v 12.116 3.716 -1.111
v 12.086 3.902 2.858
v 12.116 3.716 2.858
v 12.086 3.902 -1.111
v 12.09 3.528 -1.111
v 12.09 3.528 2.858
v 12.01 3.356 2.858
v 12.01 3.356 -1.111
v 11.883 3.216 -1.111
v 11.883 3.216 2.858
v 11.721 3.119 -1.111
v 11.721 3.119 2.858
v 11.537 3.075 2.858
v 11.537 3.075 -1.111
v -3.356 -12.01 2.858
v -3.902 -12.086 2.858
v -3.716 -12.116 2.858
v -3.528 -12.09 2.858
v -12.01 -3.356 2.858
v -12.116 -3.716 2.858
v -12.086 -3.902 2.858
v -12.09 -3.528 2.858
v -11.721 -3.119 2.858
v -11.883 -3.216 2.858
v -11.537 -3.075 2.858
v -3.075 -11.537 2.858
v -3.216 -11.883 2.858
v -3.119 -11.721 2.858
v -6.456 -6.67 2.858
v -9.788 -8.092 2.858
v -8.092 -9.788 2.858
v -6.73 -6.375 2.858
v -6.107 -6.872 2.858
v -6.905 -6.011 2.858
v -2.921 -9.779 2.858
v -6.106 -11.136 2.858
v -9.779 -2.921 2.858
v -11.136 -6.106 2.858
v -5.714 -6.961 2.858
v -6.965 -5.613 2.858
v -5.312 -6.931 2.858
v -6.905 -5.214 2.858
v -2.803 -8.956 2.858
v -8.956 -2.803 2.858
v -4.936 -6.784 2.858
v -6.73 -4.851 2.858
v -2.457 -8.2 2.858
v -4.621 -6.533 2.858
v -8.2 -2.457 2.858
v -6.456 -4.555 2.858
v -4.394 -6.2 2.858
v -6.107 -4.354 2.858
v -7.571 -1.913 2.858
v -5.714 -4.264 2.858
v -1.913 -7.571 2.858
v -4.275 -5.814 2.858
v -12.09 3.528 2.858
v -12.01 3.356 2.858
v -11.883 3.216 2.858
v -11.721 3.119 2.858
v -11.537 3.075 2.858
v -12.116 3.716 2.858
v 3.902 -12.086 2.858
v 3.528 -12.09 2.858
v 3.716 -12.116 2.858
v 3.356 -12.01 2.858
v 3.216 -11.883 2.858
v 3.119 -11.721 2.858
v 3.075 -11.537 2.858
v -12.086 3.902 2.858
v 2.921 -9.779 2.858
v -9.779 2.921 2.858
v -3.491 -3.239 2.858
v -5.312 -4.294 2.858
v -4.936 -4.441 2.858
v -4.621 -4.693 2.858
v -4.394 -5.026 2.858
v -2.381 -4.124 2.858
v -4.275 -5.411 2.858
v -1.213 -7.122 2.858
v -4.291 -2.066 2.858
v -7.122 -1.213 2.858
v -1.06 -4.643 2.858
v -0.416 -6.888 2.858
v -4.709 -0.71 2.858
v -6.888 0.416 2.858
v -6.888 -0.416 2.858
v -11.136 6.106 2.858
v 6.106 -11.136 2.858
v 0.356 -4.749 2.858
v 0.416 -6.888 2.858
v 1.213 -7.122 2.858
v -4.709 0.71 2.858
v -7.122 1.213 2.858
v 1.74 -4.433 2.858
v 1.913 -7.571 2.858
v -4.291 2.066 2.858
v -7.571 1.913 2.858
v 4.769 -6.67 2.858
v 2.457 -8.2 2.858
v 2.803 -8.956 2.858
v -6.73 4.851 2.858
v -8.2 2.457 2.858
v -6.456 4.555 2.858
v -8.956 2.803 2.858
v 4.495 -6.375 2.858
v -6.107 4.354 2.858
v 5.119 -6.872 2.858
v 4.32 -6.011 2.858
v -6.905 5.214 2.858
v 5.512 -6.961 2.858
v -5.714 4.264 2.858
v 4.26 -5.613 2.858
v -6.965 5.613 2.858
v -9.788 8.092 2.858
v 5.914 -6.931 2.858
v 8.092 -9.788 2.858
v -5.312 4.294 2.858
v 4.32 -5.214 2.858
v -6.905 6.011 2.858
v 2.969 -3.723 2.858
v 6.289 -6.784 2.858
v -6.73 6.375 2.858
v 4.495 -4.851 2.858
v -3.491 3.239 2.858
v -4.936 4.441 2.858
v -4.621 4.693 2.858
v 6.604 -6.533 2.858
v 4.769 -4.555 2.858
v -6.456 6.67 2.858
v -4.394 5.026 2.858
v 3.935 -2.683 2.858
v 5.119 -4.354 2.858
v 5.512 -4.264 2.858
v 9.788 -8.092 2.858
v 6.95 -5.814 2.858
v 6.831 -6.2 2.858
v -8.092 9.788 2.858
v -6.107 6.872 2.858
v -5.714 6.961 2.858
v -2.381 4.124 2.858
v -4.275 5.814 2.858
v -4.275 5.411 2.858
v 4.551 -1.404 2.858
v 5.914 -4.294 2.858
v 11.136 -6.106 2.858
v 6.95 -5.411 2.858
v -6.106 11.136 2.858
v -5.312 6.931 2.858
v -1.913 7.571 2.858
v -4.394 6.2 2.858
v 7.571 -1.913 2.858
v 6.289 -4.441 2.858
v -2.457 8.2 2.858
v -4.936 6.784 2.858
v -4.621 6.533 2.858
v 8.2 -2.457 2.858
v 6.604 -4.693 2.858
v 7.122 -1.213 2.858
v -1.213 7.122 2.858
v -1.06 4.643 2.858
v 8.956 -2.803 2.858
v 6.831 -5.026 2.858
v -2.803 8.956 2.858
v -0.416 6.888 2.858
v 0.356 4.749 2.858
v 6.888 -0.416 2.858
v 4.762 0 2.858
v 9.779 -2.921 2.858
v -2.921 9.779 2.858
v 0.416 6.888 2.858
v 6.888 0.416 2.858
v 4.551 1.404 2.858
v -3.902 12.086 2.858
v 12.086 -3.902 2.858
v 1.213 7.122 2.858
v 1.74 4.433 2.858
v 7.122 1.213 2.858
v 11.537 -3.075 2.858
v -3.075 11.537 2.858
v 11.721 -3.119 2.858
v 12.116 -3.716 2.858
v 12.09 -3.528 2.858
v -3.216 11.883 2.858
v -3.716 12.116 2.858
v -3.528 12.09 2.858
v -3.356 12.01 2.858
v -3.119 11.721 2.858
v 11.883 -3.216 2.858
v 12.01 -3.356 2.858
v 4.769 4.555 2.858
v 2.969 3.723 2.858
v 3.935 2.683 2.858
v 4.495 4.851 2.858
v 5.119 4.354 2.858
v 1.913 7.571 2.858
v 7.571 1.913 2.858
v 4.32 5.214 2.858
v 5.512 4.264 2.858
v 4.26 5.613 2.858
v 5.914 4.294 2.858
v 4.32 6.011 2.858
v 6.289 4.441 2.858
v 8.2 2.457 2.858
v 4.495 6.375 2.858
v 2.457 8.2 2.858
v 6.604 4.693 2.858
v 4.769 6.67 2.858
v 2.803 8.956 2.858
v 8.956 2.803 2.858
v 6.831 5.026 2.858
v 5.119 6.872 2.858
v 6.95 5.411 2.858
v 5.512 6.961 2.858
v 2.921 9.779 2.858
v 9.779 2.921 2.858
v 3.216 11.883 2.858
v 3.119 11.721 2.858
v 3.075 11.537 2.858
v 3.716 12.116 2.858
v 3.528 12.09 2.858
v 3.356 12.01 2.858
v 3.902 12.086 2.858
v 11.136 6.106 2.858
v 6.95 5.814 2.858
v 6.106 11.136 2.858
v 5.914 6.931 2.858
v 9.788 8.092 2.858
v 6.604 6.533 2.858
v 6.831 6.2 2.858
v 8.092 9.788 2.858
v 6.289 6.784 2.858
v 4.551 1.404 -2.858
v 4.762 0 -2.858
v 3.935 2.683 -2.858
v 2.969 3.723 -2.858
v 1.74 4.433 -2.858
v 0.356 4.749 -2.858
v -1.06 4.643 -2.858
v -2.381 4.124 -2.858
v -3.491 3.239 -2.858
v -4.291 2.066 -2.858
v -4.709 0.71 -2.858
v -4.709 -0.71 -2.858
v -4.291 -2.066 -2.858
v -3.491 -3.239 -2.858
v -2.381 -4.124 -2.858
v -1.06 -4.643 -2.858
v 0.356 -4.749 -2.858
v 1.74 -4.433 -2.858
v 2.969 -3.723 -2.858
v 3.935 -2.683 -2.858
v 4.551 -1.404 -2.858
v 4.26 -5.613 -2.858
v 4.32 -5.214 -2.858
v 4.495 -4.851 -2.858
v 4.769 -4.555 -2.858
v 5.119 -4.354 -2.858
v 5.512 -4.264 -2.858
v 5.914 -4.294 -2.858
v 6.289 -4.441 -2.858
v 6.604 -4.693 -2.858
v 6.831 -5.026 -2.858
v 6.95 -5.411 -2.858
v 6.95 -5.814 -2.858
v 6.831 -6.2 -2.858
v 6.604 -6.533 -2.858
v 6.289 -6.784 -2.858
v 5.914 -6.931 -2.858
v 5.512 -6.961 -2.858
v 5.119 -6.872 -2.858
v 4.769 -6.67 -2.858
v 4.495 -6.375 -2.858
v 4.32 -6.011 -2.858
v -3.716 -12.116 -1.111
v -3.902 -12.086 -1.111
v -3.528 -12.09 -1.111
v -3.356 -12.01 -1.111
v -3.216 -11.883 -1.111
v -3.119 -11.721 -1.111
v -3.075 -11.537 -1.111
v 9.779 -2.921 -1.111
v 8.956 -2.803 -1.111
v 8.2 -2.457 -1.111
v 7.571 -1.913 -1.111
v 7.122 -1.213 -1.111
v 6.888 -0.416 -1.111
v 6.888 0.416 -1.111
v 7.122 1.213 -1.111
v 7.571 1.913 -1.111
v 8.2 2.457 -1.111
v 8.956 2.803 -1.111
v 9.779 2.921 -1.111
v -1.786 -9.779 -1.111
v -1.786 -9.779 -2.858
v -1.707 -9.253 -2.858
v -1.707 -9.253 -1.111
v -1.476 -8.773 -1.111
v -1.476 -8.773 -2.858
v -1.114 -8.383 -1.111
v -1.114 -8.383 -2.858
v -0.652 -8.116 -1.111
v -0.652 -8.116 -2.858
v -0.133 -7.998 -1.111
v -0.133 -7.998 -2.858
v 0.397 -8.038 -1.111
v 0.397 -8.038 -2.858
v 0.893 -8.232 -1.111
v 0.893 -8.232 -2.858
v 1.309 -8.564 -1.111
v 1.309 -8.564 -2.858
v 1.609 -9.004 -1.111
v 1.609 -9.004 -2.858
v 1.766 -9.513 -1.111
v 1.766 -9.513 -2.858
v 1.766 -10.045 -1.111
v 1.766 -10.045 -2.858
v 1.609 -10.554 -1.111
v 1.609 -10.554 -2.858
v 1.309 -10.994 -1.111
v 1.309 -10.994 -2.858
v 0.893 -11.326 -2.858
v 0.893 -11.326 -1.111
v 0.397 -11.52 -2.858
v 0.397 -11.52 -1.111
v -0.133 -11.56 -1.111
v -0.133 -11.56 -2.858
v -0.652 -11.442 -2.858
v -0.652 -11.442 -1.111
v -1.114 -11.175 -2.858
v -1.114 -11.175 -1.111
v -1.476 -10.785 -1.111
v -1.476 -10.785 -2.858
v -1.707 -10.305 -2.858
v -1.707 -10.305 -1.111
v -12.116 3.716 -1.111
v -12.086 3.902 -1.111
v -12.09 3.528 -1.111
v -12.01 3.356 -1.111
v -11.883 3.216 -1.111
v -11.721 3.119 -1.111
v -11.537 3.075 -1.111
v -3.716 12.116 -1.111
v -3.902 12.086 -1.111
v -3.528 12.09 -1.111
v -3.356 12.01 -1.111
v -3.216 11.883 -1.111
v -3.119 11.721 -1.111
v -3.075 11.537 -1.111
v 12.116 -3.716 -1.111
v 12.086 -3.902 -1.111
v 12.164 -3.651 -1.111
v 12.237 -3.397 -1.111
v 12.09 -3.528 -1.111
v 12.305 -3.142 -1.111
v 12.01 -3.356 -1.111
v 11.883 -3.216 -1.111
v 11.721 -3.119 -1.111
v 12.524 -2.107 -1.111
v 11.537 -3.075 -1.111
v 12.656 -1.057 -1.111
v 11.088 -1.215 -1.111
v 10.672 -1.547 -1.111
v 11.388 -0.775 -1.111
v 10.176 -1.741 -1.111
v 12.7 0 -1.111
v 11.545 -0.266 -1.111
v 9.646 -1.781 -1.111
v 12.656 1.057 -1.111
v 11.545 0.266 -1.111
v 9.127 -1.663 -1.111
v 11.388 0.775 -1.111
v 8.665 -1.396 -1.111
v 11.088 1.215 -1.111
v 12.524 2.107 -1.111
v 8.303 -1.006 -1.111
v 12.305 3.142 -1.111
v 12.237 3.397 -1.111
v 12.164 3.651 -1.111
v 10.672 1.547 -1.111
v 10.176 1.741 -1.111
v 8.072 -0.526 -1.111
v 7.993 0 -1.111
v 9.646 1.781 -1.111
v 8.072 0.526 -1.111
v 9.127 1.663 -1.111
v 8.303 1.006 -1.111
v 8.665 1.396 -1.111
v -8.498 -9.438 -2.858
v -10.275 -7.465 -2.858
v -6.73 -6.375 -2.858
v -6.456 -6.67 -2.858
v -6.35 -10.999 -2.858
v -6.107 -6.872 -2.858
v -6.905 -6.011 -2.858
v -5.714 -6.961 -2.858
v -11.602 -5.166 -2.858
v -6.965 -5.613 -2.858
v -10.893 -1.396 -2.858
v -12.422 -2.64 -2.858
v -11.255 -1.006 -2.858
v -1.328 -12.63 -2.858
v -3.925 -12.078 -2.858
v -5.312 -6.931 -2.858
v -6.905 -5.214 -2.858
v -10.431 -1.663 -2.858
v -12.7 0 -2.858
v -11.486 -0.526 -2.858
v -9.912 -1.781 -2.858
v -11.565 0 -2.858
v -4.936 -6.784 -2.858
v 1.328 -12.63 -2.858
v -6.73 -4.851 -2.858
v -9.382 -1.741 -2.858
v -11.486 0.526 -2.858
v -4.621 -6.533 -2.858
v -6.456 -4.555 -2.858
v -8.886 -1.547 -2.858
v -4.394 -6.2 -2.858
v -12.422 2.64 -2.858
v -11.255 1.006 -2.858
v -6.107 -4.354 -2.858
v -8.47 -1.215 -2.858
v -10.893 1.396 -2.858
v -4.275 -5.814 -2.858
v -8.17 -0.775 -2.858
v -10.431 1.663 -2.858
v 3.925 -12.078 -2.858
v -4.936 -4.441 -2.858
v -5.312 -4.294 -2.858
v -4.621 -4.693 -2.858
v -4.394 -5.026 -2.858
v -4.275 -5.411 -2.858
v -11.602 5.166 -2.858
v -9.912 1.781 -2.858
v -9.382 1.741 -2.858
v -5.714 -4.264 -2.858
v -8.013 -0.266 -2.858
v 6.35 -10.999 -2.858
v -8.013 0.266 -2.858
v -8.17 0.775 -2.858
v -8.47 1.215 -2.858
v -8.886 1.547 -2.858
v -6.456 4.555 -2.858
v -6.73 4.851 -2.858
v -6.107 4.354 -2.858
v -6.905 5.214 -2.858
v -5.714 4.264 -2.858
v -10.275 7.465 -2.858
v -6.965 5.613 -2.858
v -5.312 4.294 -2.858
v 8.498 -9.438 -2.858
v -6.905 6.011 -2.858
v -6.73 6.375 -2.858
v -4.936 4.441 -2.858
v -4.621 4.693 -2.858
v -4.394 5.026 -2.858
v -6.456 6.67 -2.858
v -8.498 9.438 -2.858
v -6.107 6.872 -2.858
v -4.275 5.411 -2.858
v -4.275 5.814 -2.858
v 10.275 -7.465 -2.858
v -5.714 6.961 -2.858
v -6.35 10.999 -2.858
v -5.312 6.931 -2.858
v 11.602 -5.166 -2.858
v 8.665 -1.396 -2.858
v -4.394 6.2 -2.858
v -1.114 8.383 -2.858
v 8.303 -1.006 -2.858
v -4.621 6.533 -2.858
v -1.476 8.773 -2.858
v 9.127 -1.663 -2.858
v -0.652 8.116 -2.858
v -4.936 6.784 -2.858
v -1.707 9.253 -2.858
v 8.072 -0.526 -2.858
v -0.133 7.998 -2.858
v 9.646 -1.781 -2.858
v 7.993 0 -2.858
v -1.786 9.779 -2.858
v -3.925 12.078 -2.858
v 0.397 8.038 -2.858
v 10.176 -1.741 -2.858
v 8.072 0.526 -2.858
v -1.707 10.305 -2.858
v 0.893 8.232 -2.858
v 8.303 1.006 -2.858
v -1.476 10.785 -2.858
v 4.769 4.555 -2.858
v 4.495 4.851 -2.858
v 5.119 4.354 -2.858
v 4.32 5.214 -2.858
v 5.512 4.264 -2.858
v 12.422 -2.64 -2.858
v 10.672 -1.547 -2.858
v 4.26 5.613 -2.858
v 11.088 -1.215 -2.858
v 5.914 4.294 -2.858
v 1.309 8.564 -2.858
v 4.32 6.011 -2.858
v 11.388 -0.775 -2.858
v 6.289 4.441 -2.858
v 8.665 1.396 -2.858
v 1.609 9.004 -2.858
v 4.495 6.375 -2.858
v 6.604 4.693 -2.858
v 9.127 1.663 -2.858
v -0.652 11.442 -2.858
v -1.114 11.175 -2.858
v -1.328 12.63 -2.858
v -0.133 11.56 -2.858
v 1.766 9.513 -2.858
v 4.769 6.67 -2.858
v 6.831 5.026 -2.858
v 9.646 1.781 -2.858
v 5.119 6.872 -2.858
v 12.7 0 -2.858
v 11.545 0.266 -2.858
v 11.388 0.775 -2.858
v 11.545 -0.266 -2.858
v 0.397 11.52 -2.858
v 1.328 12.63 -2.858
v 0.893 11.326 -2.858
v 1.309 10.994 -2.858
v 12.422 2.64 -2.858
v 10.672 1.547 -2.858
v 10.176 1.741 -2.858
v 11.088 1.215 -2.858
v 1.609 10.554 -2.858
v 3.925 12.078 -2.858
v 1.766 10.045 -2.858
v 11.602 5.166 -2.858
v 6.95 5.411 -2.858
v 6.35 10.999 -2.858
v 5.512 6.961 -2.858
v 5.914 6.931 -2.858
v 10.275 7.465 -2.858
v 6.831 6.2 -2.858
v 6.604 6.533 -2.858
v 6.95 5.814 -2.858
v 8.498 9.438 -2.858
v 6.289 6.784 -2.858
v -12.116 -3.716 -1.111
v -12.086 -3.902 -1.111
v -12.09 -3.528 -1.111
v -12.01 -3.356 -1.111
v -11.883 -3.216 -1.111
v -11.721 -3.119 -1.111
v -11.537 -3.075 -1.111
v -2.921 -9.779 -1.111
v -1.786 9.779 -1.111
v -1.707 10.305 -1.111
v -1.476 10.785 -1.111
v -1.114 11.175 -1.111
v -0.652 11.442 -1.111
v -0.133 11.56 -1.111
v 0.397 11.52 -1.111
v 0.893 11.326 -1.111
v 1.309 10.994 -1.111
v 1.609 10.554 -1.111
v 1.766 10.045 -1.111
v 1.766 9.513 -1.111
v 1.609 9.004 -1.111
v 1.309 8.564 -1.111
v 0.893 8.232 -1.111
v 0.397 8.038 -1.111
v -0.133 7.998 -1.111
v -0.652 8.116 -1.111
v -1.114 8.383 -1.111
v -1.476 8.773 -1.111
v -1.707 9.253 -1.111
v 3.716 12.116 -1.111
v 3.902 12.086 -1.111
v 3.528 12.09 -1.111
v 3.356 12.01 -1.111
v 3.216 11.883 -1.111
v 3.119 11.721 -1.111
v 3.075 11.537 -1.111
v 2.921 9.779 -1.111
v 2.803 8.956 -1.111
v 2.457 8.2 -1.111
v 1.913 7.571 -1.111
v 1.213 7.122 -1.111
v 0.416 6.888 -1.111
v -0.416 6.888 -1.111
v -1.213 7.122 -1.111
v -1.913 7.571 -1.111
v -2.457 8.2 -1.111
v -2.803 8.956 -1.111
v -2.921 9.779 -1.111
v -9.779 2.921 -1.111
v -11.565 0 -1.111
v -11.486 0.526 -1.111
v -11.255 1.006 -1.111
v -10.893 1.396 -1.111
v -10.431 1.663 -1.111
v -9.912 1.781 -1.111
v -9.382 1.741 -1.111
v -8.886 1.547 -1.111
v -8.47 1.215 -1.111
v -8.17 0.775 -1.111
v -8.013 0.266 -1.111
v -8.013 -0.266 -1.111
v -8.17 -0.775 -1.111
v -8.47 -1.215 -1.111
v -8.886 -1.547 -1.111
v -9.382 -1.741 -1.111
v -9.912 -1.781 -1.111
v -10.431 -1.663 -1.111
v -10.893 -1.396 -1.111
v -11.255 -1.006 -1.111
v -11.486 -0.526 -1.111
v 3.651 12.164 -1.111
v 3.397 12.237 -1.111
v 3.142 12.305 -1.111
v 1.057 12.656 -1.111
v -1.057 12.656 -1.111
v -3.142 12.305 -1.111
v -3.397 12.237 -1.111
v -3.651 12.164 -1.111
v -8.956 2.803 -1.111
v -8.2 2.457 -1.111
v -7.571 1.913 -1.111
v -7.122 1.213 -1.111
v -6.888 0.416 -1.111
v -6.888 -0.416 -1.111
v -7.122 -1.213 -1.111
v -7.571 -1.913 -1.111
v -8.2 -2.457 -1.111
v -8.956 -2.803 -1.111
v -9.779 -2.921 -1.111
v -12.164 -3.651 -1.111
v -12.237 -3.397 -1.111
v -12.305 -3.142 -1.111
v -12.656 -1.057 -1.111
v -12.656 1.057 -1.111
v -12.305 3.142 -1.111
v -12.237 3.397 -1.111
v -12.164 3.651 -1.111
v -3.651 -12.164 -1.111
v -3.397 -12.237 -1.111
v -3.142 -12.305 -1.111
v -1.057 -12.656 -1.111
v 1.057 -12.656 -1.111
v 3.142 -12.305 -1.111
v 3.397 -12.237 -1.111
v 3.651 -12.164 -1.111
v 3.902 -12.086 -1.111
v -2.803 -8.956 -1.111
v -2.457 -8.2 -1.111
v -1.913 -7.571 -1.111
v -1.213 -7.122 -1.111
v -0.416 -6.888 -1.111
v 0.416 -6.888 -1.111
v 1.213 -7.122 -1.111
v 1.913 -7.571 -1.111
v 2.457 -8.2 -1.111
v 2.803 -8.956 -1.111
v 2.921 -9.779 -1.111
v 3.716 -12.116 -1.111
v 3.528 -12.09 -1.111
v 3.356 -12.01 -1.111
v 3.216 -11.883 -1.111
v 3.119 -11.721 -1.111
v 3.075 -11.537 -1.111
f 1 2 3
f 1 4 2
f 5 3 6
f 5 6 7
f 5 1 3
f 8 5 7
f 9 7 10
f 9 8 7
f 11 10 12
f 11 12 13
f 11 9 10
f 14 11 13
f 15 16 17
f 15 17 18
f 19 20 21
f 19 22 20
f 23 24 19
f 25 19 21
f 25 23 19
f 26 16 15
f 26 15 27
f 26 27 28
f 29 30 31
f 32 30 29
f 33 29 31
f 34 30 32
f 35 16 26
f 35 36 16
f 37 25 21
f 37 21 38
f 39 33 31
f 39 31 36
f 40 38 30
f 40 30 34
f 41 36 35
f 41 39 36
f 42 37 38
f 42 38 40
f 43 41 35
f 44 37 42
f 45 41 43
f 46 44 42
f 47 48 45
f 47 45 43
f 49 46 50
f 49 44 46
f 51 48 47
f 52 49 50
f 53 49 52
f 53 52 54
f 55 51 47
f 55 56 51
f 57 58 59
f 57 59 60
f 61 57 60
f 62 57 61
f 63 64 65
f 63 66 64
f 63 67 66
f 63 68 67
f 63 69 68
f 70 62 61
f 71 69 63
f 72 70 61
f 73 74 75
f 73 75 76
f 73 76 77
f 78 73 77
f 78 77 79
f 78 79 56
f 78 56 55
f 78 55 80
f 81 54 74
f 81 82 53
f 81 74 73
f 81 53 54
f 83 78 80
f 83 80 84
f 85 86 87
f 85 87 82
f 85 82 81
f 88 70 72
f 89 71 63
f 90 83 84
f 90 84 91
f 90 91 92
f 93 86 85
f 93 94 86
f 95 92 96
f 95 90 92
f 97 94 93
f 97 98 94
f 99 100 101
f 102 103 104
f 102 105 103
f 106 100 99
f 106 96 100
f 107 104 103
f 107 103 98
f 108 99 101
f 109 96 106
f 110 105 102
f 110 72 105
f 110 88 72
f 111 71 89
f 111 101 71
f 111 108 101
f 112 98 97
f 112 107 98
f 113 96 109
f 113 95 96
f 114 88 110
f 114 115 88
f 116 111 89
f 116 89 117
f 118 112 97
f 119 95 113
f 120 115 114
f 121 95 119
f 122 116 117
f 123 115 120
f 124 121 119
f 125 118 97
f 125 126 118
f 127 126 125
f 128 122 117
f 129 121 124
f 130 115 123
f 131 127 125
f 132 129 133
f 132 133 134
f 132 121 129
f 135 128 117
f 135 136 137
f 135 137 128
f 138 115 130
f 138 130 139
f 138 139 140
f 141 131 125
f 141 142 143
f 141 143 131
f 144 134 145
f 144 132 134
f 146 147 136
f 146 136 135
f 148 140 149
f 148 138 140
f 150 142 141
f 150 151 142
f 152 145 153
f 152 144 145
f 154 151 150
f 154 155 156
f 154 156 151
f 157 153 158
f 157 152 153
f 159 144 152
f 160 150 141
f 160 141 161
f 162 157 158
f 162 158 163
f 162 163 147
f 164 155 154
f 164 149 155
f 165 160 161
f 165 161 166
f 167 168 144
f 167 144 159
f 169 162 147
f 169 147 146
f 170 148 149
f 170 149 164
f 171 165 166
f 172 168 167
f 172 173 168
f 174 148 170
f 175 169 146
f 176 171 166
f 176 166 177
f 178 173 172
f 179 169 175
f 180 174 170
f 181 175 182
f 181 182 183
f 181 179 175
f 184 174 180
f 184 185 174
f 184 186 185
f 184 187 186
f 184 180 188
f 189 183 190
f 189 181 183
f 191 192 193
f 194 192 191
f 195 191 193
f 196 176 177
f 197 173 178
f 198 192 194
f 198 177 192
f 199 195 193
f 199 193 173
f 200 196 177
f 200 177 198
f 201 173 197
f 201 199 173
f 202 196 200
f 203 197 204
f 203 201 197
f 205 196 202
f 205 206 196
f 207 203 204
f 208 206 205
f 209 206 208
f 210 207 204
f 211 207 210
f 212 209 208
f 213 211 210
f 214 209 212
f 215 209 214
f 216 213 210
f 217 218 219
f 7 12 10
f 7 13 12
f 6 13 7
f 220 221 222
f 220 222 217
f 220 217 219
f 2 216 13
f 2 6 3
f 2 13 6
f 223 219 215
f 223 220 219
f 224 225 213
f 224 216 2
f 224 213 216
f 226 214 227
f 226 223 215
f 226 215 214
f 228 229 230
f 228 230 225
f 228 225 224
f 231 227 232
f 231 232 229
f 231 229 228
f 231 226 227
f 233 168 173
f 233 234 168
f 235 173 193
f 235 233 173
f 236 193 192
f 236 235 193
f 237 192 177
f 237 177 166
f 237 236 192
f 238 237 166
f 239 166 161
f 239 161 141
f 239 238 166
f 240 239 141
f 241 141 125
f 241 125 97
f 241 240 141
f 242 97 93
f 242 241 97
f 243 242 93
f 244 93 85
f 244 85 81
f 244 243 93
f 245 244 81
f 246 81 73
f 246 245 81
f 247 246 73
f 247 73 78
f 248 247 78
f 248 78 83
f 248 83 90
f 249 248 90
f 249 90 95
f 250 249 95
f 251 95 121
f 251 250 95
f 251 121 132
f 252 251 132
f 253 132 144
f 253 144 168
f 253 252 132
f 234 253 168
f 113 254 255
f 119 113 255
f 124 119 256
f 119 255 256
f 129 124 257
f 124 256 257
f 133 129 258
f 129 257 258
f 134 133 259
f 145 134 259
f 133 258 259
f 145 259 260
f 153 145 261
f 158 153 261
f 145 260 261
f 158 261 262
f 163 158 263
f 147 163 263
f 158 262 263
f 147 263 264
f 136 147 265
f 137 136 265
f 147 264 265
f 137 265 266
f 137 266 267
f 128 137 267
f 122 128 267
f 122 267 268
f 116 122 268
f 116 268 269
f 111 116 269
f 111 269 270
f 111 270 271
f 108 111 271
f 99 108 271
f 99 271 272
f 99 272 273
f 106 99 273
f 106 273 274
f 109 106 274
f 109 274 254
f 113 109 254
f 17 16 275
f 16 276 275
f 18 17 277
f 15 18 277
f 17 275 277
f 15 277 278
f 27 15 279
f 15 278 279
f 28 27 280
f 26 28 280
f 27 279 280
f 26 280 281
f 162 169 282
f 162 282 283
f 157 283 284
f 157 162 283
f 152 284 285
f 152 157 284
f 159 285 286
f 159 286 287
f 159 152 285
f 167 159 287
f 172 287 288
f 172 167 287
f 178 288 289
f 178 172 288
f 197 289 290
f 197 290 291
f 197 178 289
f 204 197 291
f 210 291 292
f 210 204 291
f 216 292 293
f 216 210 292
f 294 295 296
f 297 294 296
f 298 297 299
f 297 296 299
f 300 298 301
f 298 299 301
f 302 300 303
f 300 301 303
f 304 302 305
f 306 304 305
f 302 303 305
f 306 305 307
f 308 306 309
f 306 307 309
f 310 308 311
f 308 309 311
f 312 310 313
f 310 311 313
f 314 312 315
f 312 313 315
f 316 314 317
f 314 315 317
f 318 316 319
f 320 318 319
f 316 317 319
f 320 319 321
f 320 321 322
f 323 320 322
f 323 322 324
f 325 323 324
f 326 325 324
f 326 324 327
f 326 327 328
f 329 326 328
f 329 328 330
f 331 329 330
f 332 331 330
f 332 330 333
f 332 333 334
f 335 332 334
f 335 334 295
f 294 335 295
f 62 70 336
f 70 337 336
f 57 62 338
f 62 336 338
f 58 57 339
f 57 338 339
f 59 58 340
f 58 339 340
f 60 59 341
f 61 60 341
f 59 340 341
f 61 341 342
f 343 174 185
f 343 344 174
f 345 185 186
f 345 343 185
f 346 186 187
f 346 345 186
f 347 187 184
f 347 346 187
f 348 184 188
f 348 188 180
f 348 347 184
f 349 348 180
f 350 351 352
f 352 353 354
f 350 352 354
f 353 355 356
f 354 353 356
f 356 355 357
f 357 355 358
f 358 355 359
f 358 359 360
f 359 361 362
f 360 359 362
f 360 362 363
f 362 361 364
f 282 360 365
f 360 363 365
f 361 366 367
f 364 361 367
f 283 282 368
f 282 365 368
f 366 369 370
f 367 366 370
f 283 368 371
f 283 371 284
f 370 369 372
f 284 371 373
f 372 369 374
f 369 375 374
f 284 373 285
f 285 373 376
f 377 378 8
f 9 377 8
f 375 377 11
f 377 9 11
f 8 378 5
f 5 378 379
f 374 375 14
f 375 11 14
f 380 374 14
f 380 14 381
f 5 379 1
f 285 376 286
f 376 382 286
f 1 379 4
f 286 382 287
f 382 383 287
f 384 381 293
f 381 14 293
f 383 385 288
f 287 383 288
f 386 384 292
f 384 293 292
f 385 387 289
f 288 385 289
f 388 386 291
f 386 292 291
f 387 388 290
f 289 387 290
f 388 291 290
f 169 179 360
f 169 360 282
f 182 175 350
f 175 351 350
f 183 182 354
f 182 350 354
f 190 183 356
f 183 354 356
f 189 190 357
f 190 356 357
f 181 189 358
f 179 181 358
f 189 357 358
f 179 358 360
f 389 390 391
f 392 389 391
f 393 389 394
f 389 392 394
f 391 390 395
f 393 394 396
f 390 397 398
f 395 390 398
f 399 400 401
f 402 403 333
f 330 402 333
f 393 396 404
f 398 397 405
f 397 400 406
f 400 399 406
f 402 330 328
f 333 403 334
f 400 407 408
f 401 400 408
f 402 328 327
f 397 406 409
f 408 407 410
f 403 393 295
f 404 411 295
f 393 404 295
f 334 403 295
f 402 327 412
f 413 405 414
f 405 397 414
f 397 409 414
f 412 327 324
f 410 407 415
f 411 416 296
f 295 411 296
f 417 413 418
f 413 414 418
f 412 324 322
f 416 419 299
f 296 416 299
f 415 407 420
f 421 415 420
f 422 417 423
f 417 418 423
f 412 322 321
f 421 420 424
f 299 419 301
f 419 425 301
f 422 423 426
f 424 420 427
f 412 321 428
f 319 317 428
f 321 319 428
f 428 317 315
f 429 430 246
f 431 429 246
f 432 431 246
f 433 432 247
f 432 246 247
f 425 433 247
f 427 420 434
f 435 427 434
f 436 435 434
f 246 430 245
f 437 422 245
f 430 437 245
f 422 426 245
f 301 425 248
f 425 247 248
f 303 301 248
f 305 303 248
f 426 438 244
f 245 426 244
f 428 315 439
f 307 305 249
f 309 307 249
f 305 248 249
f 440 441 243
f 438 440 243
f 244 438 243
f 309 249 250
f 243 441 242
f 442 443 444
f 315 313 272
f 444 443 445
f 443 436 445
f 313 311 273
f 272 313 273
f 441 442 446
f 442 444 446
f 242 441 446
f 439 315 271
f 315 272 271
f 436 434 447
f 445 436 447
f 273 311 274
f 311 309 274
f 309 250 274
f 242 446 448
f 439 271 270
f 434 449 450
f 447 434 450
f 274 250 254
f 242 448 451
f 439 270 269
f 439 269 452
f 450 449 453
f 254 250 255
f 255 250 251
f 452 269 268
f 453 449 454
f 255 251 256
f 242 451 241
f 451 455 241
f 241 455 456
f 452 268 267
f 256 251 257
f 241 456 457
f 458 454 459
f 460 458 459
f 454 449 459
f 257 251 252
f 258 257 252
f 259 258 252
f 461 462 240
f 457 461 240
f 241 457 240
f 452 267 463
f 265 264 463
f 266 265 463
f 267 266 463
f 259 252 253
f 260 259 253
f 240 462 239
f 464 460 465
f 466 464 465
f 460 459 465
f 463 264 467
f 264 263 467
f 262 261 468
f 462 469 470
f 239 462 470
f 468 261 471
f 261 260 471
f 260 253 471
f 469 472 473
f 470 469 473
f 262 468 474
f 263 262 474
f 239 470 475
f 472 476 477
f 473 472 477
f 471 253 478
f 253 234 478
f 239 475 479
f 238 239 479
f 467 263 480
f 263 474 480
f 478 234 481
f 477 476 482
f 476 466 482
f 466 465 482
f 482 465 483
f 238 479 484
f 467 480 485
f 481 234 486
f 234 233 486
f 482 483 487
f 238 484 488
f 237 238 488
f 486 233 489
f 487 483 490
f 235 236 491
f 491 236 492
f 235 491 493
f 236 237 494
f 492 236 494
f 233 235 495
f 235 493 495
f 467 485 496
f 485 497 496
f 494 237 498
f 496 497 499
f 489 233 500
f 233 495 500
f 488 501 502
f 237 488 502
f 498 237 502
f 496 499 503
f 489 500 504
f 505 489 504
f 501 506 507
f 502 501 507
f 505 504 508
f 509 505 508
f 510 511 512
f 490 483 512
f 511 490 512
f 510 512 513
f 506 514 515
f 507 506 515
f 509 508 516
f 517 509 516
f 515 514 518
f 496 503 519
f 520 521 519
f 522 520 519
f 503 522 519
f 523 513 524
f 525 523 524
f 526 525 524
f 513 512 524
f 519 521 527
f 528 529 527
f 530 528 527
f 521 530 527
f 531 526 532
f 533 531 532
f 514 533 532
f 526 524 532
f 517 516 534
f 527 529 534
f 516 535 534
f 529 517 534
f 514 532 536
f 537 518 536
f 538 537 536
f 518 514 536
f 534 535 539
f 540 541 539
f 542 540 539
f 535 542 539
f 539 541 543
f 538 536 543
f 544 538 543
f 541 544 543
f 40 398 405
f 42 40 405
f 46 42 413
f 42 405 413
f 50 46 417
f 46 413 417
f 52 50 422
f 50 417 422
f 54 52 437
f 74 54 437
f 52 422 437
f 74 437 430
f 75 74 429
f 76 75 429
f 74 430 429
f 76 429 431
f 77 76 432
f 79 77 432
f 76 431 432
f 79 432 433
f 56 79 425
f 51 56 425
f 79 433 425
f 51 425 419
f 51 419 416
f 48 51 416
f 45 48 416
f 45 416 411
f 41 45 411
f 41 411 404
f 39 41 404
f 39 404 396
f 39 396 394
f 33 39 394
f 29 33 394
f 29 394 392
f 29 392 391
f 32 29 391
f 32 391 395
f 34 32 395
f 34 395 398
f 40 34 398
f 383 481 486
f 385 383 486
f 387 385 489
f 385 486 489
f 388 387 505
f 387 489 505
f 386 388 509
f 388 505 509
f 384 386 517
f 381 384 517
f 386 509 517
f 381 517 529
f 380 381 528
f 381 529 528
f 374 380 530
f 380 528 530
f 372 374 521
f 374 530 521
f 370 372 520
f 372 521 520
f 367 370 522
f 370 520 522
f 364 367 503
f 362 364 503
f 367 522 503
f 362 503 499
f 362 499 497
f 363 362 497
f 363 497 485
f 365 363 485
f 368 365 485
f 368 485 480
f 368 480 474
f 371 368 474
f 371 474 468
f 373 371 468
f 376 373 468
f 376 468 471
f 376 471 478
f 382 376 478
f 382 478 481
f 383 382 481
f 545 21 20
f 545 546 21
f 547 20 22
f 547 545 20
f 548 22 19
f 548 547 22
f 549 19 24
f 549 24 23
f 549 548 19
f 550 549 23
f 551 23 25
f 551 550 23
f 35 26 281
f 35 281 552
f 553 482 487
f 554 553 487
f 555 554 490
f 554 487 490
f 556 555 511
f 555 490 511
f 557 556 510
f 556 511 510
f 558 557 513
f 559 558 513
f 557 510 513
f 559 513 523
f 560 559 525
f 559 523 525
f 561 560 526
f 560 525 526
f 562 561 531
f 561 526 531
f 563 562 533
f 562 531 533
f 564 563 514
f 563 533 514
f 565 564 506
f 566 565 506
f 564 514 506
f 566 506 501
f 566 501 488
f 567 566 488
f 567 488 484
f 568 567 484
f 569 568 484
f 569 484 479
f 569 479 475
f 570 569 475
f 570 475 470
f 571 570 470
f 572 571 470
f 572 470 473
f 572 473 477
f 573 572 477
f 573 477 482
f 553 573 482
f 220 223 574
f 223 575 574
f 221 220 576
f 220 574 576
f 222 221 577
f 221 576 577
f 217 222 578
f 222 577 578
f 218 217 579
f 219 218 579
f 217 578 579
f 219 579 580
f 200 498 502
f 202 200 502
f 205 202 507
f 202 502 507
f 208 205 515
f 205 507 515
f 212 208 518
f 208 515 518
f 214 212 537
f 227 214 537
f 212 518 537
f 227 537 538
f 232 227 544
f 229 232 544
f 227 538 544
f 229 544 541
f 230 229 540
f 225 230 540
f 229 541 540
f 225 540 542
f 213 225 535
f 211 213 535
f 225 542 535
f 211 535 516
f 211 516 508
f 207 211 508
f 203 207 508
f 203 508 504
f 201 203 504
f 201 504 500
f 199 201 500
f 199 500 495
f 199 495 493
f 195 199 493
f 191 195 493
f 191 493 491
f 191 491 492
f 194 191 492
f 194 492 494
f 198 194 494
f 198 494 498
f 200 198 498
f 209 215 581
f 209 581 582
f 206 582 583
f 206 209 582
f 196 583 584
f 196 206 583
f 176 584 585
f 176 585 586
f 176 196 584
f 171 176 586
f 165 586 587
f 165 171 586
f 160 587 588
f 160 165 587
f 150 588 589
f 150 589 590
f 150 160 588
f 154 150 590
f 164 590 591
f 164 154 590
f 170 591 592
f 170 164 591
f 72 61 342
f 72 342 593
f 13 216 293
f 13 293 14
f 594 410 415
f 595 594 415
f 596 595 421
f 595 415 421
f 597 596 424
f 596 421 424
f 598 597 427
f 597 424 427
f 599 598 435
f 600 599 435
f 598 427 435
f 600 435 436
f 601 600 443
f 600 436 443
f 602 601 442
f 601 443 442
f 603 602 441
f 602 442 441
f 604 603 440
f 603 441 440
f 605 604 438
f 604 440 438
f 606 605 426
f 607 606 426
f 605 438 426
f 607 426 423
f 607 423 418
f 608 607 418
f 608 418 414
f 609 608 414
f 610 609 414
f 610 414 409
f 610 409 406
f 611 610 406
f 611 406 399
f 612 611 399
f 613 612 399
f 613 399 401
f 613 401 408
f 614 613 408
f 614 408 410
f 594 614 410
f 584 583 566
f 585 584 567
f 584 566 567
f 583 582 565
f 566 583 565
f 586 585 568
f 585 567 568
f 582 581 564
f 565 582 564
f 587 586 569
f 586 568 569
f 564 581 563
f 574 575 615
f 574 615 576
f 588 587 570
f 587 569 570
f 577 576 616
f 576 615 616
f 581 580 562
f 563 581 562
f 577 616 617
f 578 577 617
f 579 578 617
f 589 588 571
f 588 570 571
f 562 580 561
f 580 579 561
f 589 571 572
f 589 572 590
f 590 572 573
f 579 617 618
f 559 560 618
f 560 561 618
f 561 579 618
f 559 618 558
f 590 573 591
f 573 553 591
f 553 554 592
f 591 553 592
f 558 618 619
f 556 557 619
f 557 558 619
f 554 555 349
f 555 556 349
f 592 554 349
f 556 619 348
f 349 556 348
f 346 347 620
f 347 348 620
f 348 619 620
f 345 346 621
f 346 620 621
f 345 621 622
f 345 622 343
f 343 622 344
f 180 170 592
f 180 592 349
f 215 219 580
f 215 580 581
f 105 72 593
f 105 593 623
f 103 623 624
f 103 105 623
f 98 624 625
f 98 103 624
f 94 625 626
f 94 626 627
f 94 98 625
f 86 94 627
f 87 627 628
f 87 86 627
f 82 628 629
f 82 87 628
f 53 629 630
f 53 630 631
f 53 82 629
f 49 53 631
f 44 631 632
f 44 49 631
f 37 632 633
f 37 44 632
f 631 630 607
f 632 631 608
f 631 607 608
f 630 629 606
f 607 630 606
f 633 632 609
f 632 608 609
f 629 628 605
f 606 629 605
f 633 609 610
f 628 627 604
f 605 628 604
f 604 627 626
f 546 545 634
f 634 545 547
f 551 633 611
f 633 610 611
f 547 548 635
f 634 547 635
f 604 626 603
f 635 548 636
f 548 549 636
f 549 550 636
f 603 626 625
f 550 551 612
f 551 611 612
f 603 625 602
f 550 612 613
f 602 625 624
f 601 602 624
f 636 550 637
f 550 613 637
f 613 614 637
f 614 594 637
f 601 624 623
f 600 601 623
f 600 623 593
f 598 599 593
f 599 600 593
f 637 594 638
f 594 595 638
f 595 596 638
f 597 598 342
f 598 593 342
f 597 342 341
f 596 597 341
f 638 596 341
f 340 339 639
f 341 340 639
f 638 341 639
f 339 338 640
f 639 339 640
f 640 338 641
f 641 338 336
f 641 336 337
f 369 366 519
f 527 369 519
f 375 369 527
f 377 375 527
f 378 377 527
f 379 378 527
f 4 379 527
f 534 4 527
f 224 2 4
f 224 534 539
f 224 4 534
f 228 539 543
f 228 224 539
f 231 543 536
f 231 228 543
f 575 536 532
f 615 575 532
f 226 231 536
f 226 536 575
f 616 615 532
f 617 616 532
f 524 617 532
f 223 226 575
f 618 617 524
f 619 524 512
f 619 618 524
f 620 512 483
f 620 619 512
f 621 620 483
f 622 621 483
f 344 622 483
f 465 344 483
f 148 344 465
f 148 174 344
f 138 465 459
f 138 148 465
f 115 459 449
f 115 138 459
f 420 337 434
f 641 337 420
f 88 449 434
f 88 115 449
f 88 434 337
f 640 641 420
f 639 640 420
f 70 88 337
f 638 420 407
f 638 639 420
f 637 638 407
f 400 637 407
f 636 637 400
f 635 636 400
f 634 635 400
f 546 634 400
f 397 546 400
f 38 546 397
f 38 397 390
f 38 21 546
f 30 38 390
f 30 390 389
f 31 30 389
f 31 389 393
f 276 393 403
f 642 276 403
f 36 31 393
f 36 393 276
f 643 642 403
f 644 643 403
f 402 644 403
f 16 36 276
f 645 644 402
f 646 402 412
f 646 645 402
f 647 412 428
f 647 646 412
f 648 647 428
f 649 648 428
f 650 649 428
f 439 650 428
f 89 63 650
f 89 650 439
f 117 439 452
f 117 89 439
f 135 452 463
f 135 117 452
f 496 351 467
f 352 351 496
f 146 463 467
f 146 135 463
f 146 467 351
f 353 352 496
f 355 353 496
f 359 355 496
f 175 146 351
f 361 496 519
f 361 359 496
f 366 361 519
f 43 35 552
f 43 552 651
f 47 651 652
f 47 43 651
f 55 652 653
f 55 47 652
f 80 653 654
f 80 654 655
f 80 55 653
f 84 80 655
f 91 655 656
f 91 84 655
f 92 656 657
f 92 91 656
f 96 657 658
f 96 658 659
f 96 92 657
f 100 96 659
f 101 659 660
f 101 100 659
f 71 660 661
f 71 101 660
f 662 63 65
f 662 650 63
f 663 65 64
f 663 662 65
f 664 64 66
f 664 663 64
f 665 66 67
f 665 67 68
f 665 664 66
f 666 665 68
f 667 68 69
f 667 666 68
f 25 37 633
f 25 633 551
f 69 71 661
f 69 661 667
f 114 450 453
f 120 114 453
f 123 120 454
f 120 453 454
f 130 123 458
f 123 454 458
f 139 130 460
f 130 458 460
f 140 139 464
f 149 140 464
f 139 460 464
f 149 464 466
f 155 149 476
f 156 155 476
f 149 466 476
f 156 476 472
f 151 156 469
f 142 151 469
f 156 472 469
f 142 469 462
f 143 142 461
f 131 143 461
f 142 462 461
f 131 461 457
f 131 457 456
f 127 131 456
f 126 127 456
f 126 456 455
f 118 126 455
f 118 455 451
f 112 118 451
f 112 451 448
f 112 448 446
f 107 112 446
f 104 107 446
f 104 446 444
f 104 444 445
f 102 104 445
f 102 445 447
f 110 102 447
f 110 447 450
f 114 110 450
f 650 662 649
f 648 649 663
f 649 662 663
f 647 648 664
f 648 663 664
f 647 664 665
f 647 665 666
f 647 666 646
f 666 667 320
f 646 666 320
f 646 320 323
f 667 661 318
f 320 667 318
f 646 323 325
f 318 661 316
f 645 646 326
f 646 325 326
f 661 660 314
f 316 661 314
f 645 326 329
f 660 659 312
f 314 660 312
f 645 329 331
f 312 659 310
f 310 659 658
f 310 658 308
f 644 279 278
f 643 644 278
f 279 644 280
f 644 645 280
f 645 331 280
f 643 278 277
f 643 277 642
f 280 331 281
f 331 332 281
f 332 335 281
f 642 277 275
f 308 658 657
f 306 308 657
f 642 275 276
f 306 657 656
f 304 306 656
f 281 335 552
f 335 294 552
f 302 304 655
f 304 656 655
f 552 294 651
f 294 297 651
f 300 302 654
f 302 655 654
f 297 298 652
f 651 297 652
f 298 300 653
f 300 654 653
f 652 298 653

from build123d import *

# Parameters (mm, degrees)
SKETCH1_R                       = 12.7
SKETCH1_R_2                     = 4.7625
BOSS_EXTRUDE1_DEPTH             = 2.8575
F_6_32_TAPPED_HOLE1_D           = 2.7051
CUT_EXTRUDE1_DEPTH              = 3.96875
F_9_64_0_14063_DIAMETER_HOLE1_D = 3.572002
FILLET1_R                       = 0.635


with BuildPart() as part:
    # Sketch1 → Boss-Extrude1 (new, symmetric)
    with BuildSketch(Plane.XY):
        Circle(SKETCH1_R)
        Circle(SKETCH1_R_2, mode=Mode.SUBTRACT)
    extrude(amount=BOSS_EXTRUDE1_DEPTH, both=True)

    # #6-32 Tapped Hole1 (through all)
    with Locations(Plane.XY.offset(2.8575)):
        with Locations((5.612660076, 5.612660076), (5.612660076, -5.612660076), (-5.612660076, -5.612660076), (-5.612660076, 5.612660076)):
            Hole(F_6_32_TAPPED_HOLE1_D / 2)

    # Sketch5 → Cut-Extrude1 (cut)
    with BuildSketch(Plane.XY.offset(2.8575)):
        with BuildLine():
            Line((9.779, 2.921), (12.305192125, 3.142013173))
            ThreePointArc((12.305192125, 3.142013173), (12.7, 0), (12.305192125, -3.142013173))
            Line((12.305192125, -3.142013173), (9.779, -2.921))
            ThreePointArc((9.779, -2.921), (6.858, 0), (9.779, 2.921))
        make_face()
        with BuildLine():
            Line((2.921, -9.779), (3.142013173, -12.305192125))
            ThreePointArc((3.142013173, -12.305192125), (0, -12.7), (-3.142013173, -12.305192125))
            Line((-3.142013173, -12.305192125), (-2.921, -9.779))
            ThreePointArc((-2.921, -9.779), (0, -6.858), (2.921, -9.779))
        make_face()
        with BuildLine():
            Line((-9.779, -2.921), (-12.305192125, -3.142013173))
            ThreePointArc((-12.305192125, -3.142013173), (-12.7, 0), (-12.305192125, 3.142013173))
            Line((-12.305192125, 3.142013173), (-9.779, 2.921))
            ThreePointArc((-9.779, 2.921), (-6.858, 0), (-9.779, -2.921))
        make_face()
        with BuildLine():
            Line((-2.921, 9.779), (-3.142013173, 12.305192125))
            ThreePointArc((-3.142013173, 12.305192125), (0, 12.7), (3.142013173, 12.305192125))
            Line((3.142013173, 12.305192125), (2.921, 9.779))
            ThreePointArc((2.921, 9.779), (0, 6.858), (-2.921, 9.779))
        make_face()
    extrude(amount=-CUT_EXTRUDE1_DEPTH, mode=Mode.SUBTRACT)

    # 9/64 (0.14063) Diameter Hole1 (through all)
    with Locations(Plane.XY.offset(-1.11125)):
        with Locations((0, 9.779), (-9.779, 0), (0, -9.779), (9.779, 0)):
            Hole(F_9_64_0_14063_DIAMETER_HOLE1_D / 2)

    # Fillet1
    fillet1_edges = [part.edges().sort_by_distance(p)[0] for p in [
        (12.305192125, 3.142013173, 0.873125),
        (12.305192125, -3.142013173, 0.873125),
        (3.142013173, -12.305192125, 0.873125),
        (-3.142013173, -12.305192125, 0.873125),
        (-12.305192125, -3.142013173, 0.873125),
        (-12.305192125, 3.142013173, 0.873125),
        (-3.142013173, 12.305192125, 0.873125),
        (3.142013173, 12.305192125, 0.873125),
    ]]
    fillet(fillet1_edges, radius=FILLET1_R)


solid = part.part
